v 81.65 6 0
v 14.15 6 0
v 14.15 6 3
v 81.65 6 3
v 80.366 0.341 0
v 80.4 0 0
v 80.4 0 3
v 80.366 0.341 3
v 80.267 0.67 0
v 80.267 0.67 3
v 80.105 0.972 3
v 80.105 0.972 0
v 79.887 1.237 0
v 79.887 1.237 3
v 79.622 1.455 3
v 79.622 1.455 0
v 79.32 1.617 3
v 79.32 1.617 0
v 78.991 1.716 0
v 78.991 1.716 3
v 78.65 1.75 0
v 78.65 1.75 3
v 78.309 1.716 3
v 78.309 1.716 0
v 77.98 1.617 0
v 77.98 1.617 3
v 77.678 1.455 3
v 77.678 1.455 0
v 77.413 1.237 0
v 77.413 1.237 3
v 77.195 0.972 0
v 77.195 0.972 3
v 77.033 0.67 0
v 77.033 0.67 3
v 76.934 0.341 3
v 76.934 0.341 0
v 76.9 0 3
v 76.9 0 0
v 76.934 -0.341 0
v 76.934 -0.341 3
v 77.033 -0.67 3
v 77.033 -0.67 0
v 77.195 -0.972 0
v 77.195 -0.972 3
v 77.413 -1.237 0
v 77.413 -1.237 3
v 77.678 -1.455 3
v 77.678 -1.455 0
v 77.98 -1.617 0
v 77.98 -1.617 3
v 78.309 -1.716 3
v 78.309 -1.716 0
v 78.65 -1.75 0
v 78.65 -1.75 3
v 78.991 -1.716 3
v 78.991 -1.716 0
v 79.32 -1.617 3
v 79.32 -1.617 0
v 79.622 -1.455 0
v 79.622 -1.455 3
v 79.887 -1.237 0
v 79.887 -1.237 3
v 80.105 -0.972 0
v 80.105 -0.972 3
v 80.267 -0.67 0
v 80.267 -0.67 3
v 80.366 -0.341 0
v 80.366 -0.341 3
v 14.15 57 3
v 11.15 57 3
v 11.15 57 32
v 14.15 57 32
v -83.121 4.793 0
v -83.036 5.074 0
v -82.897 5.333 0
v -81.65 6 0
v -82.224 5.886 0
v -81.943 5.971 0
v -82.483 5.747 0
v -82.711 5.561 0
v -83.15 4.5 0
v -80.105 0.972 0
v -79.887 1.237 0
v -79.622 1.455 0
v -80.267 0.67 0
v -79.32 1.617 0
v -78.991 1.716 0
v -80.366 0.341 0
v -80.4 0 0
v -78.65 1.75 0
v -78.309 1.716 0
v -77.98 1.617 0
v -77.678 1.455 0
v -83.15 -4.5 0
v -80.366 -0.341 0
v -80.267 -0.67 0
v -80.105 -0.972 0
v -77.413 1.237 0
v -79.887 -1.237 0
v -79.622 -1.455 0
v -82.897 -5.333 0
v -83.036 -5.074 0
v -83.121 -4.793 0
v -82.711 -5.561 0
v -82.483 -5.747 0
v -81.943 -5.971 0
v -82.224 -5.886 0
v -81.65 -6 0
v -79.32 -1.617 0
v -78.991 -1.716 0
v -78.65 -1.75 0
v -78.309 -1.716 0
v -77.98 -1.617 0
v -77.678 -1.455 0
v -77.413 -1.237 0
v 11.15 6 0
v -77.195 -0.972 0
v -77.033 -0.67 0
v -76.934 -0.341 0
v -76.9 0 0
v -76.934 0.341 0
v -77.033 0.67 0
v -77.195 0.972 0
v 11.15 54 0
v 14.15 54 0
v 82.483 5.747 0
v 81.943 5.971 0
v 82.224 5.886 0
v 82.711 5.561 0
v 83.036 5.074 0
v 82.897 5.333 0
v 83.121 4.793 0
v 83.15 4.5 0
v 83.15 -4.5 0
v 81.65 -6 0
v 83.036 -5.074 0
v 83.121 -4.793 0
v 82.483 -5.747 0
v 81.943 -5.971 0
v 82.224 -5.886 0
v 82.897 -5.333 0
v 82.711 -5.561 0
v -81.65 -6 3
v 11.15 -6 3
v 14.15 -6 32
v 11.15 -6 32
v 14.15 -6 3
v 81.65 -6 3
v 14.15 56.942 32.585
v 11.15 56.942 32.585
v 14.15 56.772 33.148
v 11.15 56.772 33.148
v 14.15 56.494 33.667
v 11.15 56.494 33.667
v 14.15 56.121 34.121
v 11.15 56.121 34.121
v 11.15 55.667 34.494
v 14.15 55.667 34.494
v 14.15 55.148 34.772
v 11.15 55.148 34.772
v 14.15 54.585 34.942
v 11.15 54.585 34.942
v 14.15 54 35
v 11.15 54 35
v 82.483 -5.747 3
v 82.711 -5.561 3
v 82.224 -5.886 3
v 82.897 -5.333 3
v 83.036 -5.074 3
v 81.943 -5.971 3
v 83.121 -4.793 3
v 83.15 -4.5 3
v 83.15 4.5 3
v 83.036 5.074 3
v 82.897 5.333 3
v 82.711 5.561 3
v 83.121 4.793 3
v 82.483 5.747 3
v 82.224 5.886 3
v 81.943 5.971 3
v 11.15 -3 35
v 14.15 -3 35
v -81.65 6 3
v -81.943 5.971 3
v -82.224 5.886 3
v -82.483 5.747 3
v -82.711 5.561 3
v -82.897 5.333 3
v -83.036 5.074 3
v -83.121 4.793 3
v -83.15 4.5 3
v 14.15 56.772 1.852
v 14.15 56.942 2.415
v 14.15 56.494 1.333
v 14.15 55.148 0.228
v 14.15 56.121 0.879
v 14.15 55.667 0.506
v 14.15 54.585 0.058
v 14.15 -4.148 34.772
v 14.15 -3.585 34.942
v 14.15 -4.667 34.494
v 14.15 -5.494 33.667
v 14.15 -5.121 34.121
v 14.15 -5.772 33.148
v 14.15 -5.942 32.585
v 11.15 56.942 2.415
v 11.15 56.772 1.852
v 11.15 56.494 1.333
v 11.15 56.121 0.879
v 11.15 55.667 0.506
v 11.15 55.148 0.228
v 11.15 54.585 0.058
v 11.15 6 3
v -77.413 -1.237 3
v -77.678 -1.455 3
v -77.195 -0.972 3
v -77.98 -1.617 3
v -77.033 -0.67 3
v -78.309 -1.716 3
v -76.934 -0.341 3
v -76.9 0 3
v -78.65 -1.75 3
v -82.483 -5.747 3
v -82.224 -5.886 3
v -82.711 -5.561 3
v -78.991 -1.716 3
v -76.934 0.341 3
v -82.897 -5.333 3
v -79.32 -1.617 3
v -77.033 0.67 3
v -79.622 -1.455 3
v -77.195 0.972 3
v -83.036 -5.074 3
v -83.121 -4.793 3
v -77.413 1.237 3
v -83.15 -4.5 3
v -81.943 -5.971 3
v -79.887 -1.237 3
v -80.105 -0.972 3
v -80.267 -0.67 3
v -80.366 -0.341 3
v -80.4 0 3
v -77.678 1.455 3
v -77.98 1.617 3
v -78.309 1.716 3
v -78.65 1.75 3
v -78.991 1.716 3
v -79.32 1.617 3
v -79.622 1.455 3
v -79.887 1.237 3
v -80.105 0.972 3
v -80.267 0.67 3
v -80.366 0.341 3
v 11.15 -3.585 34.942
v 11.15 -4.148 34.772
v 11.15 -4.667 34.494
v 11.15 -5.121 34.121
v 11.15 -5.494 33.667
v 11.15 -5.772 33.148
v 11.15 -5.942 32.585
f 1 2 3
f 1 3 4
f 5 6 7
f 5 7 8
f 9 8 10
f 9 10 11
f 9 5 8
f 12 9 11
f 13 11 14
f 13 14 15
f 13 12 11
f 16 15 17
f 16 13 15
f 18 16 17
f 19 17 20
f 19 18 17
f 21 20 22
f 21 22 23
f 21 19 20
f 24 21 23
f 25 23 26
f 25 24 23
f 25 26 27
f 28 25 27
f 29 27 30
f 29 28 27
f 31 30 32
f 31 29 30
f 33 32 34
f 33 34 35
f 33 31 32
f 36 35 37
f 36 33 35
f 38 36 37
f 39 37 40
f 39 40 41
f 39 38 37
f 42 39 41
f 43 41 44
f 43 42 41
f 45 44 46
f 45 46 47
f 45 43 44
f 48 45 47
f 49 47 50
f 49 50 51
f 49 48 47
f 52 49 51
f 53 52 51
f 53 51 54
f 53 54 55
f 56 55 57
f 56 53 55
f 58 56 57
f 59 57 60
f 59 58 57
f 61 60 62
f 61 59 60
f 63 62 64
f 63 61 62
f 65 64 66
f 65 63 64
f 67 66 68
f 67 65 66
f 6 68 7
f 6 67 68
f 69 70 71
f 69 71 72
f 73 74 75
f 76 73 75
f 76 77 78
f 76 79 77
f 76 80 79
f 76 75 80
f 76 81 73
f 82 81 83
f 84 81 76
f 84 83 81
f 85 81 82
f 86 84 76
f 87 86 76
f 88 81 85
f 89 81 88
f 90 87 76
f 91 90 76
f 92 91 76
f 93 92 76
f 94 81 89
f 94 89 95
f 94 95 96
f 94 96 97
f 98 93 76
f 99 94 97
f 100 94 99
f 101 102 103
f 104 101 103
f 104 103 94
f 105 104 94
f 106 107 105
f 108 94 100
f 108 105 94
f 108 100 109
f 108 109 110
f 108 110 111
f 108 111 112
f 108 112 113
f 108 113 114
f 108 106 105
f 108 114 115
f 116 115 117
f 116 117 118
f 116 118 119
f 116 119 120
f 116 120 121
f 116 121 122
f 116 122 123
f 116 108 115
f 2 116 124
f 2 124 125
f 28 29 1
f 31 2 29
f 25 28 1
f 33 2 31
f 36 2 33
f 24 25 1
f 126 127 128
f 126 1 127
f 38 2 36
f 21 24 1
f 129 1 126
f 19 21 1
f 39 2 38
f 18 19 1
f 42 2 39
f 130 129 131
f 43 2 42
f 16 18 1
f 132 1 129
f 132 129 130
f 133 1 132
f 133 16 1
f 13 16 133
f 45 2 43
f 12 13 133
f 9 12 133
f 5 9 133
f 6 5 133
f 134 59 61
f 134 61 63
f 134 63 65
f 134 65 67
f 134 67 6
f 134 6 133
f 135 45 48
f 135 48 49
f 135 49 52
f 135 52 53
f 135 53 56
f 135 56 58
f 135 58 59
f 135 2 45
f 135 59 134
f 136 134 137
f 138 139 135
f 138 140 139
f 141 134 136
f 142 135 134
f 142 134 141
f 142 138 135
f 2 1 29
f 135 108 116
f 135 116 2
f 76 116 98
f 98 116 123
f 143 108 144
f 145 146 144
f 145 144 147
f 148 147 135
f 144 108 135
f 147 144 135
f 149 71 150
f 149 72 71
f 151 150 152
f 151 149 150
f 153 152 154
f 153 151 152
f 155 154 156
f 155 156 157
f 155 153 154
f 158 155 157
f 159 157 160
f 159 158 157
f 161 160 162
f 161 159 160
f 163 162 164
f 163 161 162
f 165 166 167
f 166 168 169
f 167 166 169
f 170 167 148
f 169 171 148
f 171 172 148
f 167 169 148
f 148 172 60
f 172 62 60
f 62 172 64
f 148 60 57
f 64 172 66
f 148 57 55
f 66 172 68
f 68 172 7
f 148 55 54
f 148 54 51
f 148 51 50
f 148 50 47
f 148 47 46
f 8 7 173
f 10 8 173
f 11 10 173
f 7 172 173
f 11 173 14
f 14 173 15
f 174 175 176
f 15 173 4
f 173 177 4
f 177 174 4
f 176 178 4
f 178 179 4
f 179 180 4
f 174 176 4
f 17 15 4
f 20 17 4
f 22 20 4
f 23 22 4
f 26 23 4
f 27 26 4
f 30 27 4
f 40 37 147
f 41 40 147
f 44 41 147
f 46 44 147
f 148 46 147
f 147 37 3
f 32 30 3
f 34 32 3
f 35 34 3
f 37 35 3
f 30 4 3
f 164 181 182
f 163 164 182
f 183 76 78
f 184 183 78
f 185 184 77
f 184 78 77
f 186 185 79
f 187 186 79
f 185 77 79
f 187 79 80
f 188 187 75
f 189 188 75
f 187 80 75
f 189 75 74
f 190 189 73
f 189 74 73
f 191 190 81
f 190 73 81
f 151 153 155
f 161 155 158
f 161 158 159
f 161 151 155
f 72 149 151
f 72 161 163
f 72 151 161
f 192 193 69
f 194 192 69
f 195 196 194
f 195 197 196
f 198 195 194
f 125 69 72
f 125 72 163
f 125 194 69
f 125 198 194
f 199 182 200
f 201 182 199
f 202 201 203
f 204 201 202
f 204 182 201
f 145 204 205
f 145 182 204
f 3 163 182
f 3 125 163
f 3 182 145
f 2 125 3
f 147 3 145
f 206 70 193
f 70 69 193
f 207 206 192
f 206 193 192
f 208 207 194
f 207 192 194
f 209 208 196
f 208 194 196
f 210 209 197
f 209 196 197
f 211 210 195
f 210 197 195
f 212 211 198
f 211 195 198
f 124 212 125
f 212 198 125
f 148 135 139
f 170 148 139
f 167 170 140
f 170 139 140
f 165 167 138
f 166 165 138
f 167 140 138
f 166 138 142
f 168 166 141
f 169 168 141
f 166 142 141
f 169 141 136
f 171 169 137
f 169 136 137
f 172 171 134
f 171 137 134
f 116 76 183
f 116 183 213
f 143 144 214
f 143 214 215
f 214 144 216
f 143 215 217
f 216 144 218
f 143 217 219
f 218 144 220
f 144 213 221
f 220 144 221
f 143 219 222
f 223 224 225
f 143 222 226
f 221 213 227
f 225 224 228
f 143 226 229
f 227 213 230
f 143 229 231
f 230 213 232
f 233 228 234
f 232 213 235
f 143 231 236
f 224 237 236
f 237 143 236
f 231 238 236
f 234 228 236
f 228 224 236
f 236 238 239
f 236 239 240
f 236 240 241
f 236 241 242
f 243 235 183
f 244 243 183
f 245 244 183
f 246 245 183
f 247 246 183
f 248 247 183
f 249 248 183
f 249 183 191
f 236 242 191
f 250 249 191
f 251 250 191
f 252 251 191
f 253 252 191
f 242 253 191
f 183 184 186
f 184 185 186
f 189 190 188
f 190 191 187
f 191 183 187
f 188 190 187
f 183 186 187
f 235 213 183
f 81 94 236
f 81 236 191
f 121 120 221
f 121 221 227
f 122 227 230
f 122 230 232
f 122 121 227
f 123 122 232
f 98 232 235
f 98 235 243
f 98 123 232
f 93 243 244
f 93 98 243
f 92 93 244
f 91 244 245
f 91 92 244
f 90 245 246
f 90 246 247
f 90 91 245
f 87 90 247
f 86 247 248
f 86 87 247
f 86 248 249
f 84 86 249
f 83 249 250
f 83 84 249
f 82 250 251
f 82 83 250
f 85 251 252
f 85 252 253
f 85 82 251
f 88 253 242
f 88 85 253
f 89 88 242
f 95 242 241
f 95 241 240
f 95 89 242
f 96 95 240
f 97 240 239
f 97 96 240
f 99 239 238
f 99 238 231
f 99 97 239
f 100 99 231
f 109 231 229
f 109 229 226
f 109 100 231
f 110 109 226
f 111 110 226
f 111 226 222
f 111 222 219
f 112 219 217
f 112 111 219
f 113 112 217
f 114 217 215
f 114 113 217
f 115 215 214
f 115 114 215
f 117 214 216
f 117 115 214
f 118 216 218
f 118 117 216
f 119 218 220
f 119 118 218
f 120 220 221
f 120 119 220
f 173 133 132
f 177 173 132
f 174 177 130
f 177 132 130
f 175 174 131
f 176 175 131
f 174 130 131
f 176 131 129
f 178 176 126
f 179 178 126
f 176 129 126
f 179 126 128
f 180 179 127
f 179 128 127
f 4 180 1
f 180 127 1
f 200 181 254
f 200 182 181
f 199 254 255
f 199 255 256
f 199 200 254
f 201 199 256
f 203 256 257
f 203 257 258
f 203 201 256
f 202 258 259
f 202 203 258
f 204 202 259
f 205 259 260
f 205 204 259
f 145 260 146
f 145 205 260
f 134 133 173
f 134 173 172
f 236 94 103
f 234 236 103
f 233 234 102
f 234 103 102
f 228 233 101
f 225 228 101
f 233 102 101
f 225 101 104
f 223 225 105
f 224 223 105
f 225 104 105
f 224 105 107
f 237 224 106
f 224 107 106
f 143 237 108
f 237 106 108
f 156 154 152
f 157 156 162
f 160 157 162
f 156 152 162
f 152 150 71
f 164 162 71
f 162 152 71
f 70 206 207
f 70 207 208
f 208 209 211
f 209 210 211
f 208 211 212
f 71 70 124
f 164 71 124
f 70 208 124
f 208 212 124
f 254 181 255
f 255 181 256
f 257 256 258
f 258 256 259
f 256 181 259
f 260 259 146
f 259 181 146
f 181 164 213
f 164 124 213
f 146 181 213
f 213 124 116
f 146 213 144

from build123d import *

# Parameters (mm, degrees)
SKETCH_R     = 1.75
PAD_DEPTH    = 3
SKETCH001_W  = 3
SKETCH001_H  = 63
PAD001_DEPTH = 35
FILLET_R     = 3


with BuildPart() as part:
    # Sketch → Pad (new body)
    with BuildSketch(Plane.XY):
        with BuildLine():
            Line((-81.65, 6), (81.65, 6))
            ThreePointArc((83.15, 4.5), (82.71066, 5.56066), (81.65, 6))
            Line((83.15, 4.5), (83.15, -4.5))
            ThreePointArc((81.65, -6), (82.71066, -5.56066), (83.15, -4.5))
            Line((81.65, -6), (-81.65, -6))
            ThreePointArc((-83.15, -4.5), (-82.71066, -5.56066), (-81.65, -6))
            Line((-83.15, -4.5), (-83.15, 4.5))
            ThreePointArc((-81.65, 6), (-82.71066, 5.56066), (-83.15, 4.5))
        make_face()
        with Locations((-78.65, 0)):
            Circle(SKETCH_R, mode=Mode.SUBTRACT)
        with Locations((78.65, 0)):
            Circle(SKETCH_R, mode=Mode.SUBTRACT)
    extrude(amount=PAD_DEPTH)

    # Sketch001 (on Face11 of Pad) → Pad001 (join)
    with BuildSketch(Plane(origin=(0, 0, 0), x_dir=(1, 0, 0), z_dir=(0, 0, -1))):
        with Locations((12.65, -25.5)):
            Rectangle(SKETCH001_W, SKETCH001_H)
    extrude(amount=-PAD001_DEPTH)

    # Fillet
    fillet_edges = [part.edges().sort_by_distance(p)[0] for p in [
        (12.65, -6, 35),
        (12.65, 57, 35),
        (12.65, 57, 0),
    ]]
    fillet(fillet_edges, radius=FILLET_R)


solid = part.part
